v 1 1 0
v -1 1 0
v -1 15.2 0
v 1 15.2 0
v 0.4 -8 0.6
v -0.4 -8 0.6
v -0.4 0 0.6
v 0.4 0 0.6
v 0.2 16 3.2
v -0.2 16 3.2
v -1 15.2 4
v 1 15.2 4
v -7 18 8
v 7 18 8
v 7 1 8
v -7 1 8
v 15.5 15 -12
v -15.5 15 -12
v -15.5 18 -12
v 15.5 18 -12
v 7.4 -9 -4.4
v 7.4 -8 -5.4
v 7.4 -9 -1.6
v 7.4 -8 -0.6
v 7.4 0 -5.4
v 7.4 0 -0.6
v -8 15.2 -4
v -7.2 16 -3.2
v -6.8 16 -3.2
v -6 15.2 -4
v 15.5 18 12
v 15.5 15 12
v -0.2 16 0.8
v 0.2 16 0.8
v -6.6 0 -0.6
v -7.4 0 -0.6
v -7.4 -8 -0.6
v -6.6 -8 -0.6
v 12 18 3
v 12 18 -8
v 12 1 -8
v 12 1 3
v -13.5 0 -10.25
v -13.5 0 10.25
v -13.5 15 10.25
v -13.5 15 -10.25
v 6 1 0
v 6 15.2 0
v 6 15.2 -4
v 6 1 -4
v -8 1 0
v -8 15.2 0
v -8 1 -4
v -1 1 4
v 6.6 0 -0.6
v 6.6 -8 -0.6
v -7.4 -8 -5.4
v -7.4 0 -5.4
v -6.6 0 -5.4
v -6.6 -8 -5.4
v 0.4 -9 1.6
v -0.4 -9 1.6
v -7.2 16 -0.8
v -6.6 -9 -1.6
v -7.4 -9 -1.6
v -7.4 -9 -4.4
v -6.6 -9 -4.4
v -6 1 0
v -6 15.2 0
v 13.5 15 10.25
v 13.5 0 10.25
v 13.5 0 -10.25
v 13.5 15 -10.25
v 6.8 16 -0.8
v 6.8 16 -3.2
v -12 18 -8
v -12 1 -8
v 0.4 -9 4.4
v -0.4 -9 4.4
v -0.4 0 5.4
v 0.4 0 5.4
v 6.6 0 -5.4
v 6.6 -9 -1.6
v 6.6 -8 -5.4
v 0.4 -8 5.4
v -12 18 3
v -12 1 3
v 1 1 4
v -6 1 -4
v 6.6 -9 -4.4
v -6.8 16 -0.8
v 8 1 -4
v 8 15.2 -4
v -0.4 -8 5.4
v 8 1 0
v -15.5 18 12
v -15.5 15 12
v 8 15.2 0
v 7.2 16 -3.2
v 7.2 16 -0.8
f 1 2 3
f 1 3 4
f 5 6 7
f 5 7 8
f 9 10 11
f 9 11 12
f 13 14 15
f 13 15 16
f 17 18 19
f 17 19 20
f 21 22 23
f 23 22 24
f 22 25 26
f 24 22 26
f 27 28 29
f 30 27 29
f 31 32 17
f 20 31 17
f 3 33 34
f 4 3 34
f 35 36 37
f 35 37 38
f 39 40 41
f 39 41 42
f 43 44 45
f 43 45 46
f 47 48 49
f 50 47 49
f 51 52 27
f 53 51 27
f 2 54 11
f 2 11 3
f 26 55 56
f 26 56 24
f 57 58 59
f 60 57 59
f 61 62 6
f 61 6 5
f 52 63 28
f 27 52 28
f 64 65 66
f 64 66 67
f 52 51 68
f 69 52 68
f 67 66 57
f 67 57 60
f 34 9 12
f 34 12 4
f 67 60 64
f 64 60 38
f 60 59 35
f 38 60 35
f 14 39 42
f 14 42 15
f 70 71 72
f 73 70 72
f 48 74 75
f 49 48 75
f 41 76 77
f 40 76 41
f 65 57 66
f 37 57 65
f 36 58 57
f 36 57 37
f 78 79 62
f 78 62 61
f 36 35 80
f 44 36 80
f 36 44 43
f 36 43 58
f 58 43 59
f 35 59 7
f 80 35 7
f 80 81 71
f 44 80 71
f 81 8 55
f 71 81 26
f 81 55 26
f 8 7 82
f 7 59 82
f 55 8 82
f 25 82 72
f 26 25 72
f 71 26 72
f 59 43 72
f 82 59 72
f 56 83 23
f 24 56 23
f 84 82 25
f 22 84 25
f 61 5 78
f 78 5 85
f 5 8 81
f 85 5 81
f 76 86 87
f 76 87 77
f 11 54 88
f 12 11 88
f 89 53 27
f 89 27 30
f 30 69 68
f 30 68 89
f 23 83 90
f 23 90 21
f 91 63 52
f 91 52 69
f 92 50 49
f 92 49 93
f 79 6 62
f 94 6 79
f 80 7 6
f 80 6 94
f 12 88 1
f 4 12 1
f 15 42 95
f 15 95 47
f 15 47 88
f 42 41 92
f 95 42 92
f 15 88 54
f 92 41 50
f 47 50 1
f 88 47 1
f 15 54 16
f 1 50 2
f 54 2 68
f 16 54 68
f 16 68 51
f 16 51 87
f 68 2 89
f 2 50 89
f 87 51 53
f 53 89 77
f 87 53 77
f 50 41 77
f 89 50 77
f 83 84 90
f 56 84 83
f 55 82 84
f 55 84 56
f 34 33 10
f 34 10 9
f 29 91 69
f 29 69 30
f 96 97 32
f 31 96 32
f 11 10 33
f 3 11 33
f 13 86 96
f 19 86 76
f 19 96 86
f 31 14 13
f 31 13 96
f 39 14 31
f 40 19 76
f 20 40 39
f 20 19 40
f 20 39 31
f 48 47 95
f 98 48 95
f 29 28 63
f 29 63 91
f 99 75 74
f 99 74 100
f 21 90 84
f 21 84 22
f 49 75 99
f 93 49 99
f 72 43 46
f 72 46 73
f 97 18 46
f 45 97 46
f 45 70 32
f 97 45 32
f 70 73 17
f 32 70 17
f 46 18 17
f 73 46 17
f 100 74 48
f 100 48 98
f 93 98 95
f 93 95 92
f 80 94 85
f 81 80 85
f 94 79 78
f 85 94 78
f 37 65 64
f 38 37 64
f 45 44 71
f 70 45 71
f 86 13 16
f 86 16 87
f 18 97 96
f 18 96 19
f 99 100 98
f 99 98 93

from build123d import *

# Parameters (mm, degrees)
SKETCH_1_W          = 27
SKETCH_1_H          = 20.5
EXTRUDE_1_DEPTH     = 15
SKETCH_2_W          = 0.8
SKETCH_2_H          = 4.8
EXTRUDE_2_DEPTH     = 9
CHAMFER_1_SIZE      = 1
SKETCH_3_W          = 31
SKETCH_3_H          = 24
EXTRUDE_3_DEPTH     = 3
CUT_EXTRUDE_1_DEPTH = 17
SKETCH_5_W          = 2
SKETCH_5_H          = 4
EXTRUDE_4_DEPTH     = 15
CHAMFER_2_SIZE      = 0.8


with BuildPart() as part:
    # Эскиз1 → Бобышка-Вытянуть1 (new body)
    with BuildSketch(Plane(origin=(0, 0, 0), x_dir=(1, 0, 0), z_dir=(0, 1, 0))):
        Rectangle(SKETCH_1_W, SKETCH_1_H)
    extrude(amount=EXTRUDE_1_DEPTH)

    # Эскиз2 → Бобышка-Вытянуть2 (add)
    with BuildSketch(Plane.XZ):
        with Locations((0, 3)):
            Rectangle(SKETCH_2_W, SKETCH_2_H)
        with Locations((-7, -3)):
            Rectangle(SKETCH_2_W, SKETCH_2_H)
        with Locations((7, -3)):
            Rectangle(SKETCH_2_W, SKETCH_2_H)
    extrude(amount=EXTRUDE_2_DEPTH)

    # Фаска1
    chamfer_1_edges = [part.edges().sort_by_distance(p)[0] for p in [
        (-7, -9, -0.6),
        (-7, -9, -5.4),
        (0, -9, 5.4),
        (0, -9, 0.6),
        (7, -9, -0.6),
        (7, -9, -5.4),
    ]]
    chamfer(chamfer_1_edges, length=CHAMFER_1_SIZE)

    # Эскиз3 → Бобышка-Вытянуть3 (add)
    with BuildSketch(Plane(origin=(0, 15, 0), x_dir=(1, 0, 0), z_dir=(0, 1, 0))):
        Rectangle(SKETCH_3_W, SKETCH_3_H)
    extrude(amount=EXTRUDE_3_DEPTH)

    # Эскиз4 → Вырез-Вытянуть1 (cut)
    with BuildSketch(Plane(origin=(0, 18, 0), x_dir=(1, 0, 0), z_dir=(0, 1, 0))):
        Polygon((12, -3), (7, -8), (-7, -8), (-12, -3), (-12, 8), (12, 8), align=None)
    extrude(amount=-CUT_EXTRUDE_1_DEPTH, mode=Mode.SUBTRACT)

    # Эскиз5 → Бобышка-Вытянуть4 (add)
    with BuildSketch(Plane(origin=(0, 1, 0), x_dir=(1, 0, 0), z_dir=(0, 1, 0))):
        with Locations((7, 2)):
            Rectangle(SKETCH_5_W, SKETCH_5_H)
        with Locations((0, -2)):
            Rectangle(SKETCH_5_W, SKETCH_5_H)
        with Locations((-7, 2)):
            Rectangle(SKETCH_5_W, SKETCH_5_H)
    extrude(amount=EXTRUDE_4_DEPTH)

    # Фаска2
    chamfer_2_edges = [part.edges().sort_by_distance(p)[0] for p in [
        (-1, 16, 2),
        (0, 16, 4),
        (1, 16, 2),
        (0, 16, 0),
        (6, 16, -2),
        (7, 16, 0),
        (8, 16, -2),
        (7, 16, -4),
        (-7, 16, -4),
        (-8, 16, -2),
        (-7, 16, 0),
        (-6, 16, -2),
    ]]
    chamfer(chamfer_2_edges, length=CHAMFER_2_SIZE)


solid = part.part
